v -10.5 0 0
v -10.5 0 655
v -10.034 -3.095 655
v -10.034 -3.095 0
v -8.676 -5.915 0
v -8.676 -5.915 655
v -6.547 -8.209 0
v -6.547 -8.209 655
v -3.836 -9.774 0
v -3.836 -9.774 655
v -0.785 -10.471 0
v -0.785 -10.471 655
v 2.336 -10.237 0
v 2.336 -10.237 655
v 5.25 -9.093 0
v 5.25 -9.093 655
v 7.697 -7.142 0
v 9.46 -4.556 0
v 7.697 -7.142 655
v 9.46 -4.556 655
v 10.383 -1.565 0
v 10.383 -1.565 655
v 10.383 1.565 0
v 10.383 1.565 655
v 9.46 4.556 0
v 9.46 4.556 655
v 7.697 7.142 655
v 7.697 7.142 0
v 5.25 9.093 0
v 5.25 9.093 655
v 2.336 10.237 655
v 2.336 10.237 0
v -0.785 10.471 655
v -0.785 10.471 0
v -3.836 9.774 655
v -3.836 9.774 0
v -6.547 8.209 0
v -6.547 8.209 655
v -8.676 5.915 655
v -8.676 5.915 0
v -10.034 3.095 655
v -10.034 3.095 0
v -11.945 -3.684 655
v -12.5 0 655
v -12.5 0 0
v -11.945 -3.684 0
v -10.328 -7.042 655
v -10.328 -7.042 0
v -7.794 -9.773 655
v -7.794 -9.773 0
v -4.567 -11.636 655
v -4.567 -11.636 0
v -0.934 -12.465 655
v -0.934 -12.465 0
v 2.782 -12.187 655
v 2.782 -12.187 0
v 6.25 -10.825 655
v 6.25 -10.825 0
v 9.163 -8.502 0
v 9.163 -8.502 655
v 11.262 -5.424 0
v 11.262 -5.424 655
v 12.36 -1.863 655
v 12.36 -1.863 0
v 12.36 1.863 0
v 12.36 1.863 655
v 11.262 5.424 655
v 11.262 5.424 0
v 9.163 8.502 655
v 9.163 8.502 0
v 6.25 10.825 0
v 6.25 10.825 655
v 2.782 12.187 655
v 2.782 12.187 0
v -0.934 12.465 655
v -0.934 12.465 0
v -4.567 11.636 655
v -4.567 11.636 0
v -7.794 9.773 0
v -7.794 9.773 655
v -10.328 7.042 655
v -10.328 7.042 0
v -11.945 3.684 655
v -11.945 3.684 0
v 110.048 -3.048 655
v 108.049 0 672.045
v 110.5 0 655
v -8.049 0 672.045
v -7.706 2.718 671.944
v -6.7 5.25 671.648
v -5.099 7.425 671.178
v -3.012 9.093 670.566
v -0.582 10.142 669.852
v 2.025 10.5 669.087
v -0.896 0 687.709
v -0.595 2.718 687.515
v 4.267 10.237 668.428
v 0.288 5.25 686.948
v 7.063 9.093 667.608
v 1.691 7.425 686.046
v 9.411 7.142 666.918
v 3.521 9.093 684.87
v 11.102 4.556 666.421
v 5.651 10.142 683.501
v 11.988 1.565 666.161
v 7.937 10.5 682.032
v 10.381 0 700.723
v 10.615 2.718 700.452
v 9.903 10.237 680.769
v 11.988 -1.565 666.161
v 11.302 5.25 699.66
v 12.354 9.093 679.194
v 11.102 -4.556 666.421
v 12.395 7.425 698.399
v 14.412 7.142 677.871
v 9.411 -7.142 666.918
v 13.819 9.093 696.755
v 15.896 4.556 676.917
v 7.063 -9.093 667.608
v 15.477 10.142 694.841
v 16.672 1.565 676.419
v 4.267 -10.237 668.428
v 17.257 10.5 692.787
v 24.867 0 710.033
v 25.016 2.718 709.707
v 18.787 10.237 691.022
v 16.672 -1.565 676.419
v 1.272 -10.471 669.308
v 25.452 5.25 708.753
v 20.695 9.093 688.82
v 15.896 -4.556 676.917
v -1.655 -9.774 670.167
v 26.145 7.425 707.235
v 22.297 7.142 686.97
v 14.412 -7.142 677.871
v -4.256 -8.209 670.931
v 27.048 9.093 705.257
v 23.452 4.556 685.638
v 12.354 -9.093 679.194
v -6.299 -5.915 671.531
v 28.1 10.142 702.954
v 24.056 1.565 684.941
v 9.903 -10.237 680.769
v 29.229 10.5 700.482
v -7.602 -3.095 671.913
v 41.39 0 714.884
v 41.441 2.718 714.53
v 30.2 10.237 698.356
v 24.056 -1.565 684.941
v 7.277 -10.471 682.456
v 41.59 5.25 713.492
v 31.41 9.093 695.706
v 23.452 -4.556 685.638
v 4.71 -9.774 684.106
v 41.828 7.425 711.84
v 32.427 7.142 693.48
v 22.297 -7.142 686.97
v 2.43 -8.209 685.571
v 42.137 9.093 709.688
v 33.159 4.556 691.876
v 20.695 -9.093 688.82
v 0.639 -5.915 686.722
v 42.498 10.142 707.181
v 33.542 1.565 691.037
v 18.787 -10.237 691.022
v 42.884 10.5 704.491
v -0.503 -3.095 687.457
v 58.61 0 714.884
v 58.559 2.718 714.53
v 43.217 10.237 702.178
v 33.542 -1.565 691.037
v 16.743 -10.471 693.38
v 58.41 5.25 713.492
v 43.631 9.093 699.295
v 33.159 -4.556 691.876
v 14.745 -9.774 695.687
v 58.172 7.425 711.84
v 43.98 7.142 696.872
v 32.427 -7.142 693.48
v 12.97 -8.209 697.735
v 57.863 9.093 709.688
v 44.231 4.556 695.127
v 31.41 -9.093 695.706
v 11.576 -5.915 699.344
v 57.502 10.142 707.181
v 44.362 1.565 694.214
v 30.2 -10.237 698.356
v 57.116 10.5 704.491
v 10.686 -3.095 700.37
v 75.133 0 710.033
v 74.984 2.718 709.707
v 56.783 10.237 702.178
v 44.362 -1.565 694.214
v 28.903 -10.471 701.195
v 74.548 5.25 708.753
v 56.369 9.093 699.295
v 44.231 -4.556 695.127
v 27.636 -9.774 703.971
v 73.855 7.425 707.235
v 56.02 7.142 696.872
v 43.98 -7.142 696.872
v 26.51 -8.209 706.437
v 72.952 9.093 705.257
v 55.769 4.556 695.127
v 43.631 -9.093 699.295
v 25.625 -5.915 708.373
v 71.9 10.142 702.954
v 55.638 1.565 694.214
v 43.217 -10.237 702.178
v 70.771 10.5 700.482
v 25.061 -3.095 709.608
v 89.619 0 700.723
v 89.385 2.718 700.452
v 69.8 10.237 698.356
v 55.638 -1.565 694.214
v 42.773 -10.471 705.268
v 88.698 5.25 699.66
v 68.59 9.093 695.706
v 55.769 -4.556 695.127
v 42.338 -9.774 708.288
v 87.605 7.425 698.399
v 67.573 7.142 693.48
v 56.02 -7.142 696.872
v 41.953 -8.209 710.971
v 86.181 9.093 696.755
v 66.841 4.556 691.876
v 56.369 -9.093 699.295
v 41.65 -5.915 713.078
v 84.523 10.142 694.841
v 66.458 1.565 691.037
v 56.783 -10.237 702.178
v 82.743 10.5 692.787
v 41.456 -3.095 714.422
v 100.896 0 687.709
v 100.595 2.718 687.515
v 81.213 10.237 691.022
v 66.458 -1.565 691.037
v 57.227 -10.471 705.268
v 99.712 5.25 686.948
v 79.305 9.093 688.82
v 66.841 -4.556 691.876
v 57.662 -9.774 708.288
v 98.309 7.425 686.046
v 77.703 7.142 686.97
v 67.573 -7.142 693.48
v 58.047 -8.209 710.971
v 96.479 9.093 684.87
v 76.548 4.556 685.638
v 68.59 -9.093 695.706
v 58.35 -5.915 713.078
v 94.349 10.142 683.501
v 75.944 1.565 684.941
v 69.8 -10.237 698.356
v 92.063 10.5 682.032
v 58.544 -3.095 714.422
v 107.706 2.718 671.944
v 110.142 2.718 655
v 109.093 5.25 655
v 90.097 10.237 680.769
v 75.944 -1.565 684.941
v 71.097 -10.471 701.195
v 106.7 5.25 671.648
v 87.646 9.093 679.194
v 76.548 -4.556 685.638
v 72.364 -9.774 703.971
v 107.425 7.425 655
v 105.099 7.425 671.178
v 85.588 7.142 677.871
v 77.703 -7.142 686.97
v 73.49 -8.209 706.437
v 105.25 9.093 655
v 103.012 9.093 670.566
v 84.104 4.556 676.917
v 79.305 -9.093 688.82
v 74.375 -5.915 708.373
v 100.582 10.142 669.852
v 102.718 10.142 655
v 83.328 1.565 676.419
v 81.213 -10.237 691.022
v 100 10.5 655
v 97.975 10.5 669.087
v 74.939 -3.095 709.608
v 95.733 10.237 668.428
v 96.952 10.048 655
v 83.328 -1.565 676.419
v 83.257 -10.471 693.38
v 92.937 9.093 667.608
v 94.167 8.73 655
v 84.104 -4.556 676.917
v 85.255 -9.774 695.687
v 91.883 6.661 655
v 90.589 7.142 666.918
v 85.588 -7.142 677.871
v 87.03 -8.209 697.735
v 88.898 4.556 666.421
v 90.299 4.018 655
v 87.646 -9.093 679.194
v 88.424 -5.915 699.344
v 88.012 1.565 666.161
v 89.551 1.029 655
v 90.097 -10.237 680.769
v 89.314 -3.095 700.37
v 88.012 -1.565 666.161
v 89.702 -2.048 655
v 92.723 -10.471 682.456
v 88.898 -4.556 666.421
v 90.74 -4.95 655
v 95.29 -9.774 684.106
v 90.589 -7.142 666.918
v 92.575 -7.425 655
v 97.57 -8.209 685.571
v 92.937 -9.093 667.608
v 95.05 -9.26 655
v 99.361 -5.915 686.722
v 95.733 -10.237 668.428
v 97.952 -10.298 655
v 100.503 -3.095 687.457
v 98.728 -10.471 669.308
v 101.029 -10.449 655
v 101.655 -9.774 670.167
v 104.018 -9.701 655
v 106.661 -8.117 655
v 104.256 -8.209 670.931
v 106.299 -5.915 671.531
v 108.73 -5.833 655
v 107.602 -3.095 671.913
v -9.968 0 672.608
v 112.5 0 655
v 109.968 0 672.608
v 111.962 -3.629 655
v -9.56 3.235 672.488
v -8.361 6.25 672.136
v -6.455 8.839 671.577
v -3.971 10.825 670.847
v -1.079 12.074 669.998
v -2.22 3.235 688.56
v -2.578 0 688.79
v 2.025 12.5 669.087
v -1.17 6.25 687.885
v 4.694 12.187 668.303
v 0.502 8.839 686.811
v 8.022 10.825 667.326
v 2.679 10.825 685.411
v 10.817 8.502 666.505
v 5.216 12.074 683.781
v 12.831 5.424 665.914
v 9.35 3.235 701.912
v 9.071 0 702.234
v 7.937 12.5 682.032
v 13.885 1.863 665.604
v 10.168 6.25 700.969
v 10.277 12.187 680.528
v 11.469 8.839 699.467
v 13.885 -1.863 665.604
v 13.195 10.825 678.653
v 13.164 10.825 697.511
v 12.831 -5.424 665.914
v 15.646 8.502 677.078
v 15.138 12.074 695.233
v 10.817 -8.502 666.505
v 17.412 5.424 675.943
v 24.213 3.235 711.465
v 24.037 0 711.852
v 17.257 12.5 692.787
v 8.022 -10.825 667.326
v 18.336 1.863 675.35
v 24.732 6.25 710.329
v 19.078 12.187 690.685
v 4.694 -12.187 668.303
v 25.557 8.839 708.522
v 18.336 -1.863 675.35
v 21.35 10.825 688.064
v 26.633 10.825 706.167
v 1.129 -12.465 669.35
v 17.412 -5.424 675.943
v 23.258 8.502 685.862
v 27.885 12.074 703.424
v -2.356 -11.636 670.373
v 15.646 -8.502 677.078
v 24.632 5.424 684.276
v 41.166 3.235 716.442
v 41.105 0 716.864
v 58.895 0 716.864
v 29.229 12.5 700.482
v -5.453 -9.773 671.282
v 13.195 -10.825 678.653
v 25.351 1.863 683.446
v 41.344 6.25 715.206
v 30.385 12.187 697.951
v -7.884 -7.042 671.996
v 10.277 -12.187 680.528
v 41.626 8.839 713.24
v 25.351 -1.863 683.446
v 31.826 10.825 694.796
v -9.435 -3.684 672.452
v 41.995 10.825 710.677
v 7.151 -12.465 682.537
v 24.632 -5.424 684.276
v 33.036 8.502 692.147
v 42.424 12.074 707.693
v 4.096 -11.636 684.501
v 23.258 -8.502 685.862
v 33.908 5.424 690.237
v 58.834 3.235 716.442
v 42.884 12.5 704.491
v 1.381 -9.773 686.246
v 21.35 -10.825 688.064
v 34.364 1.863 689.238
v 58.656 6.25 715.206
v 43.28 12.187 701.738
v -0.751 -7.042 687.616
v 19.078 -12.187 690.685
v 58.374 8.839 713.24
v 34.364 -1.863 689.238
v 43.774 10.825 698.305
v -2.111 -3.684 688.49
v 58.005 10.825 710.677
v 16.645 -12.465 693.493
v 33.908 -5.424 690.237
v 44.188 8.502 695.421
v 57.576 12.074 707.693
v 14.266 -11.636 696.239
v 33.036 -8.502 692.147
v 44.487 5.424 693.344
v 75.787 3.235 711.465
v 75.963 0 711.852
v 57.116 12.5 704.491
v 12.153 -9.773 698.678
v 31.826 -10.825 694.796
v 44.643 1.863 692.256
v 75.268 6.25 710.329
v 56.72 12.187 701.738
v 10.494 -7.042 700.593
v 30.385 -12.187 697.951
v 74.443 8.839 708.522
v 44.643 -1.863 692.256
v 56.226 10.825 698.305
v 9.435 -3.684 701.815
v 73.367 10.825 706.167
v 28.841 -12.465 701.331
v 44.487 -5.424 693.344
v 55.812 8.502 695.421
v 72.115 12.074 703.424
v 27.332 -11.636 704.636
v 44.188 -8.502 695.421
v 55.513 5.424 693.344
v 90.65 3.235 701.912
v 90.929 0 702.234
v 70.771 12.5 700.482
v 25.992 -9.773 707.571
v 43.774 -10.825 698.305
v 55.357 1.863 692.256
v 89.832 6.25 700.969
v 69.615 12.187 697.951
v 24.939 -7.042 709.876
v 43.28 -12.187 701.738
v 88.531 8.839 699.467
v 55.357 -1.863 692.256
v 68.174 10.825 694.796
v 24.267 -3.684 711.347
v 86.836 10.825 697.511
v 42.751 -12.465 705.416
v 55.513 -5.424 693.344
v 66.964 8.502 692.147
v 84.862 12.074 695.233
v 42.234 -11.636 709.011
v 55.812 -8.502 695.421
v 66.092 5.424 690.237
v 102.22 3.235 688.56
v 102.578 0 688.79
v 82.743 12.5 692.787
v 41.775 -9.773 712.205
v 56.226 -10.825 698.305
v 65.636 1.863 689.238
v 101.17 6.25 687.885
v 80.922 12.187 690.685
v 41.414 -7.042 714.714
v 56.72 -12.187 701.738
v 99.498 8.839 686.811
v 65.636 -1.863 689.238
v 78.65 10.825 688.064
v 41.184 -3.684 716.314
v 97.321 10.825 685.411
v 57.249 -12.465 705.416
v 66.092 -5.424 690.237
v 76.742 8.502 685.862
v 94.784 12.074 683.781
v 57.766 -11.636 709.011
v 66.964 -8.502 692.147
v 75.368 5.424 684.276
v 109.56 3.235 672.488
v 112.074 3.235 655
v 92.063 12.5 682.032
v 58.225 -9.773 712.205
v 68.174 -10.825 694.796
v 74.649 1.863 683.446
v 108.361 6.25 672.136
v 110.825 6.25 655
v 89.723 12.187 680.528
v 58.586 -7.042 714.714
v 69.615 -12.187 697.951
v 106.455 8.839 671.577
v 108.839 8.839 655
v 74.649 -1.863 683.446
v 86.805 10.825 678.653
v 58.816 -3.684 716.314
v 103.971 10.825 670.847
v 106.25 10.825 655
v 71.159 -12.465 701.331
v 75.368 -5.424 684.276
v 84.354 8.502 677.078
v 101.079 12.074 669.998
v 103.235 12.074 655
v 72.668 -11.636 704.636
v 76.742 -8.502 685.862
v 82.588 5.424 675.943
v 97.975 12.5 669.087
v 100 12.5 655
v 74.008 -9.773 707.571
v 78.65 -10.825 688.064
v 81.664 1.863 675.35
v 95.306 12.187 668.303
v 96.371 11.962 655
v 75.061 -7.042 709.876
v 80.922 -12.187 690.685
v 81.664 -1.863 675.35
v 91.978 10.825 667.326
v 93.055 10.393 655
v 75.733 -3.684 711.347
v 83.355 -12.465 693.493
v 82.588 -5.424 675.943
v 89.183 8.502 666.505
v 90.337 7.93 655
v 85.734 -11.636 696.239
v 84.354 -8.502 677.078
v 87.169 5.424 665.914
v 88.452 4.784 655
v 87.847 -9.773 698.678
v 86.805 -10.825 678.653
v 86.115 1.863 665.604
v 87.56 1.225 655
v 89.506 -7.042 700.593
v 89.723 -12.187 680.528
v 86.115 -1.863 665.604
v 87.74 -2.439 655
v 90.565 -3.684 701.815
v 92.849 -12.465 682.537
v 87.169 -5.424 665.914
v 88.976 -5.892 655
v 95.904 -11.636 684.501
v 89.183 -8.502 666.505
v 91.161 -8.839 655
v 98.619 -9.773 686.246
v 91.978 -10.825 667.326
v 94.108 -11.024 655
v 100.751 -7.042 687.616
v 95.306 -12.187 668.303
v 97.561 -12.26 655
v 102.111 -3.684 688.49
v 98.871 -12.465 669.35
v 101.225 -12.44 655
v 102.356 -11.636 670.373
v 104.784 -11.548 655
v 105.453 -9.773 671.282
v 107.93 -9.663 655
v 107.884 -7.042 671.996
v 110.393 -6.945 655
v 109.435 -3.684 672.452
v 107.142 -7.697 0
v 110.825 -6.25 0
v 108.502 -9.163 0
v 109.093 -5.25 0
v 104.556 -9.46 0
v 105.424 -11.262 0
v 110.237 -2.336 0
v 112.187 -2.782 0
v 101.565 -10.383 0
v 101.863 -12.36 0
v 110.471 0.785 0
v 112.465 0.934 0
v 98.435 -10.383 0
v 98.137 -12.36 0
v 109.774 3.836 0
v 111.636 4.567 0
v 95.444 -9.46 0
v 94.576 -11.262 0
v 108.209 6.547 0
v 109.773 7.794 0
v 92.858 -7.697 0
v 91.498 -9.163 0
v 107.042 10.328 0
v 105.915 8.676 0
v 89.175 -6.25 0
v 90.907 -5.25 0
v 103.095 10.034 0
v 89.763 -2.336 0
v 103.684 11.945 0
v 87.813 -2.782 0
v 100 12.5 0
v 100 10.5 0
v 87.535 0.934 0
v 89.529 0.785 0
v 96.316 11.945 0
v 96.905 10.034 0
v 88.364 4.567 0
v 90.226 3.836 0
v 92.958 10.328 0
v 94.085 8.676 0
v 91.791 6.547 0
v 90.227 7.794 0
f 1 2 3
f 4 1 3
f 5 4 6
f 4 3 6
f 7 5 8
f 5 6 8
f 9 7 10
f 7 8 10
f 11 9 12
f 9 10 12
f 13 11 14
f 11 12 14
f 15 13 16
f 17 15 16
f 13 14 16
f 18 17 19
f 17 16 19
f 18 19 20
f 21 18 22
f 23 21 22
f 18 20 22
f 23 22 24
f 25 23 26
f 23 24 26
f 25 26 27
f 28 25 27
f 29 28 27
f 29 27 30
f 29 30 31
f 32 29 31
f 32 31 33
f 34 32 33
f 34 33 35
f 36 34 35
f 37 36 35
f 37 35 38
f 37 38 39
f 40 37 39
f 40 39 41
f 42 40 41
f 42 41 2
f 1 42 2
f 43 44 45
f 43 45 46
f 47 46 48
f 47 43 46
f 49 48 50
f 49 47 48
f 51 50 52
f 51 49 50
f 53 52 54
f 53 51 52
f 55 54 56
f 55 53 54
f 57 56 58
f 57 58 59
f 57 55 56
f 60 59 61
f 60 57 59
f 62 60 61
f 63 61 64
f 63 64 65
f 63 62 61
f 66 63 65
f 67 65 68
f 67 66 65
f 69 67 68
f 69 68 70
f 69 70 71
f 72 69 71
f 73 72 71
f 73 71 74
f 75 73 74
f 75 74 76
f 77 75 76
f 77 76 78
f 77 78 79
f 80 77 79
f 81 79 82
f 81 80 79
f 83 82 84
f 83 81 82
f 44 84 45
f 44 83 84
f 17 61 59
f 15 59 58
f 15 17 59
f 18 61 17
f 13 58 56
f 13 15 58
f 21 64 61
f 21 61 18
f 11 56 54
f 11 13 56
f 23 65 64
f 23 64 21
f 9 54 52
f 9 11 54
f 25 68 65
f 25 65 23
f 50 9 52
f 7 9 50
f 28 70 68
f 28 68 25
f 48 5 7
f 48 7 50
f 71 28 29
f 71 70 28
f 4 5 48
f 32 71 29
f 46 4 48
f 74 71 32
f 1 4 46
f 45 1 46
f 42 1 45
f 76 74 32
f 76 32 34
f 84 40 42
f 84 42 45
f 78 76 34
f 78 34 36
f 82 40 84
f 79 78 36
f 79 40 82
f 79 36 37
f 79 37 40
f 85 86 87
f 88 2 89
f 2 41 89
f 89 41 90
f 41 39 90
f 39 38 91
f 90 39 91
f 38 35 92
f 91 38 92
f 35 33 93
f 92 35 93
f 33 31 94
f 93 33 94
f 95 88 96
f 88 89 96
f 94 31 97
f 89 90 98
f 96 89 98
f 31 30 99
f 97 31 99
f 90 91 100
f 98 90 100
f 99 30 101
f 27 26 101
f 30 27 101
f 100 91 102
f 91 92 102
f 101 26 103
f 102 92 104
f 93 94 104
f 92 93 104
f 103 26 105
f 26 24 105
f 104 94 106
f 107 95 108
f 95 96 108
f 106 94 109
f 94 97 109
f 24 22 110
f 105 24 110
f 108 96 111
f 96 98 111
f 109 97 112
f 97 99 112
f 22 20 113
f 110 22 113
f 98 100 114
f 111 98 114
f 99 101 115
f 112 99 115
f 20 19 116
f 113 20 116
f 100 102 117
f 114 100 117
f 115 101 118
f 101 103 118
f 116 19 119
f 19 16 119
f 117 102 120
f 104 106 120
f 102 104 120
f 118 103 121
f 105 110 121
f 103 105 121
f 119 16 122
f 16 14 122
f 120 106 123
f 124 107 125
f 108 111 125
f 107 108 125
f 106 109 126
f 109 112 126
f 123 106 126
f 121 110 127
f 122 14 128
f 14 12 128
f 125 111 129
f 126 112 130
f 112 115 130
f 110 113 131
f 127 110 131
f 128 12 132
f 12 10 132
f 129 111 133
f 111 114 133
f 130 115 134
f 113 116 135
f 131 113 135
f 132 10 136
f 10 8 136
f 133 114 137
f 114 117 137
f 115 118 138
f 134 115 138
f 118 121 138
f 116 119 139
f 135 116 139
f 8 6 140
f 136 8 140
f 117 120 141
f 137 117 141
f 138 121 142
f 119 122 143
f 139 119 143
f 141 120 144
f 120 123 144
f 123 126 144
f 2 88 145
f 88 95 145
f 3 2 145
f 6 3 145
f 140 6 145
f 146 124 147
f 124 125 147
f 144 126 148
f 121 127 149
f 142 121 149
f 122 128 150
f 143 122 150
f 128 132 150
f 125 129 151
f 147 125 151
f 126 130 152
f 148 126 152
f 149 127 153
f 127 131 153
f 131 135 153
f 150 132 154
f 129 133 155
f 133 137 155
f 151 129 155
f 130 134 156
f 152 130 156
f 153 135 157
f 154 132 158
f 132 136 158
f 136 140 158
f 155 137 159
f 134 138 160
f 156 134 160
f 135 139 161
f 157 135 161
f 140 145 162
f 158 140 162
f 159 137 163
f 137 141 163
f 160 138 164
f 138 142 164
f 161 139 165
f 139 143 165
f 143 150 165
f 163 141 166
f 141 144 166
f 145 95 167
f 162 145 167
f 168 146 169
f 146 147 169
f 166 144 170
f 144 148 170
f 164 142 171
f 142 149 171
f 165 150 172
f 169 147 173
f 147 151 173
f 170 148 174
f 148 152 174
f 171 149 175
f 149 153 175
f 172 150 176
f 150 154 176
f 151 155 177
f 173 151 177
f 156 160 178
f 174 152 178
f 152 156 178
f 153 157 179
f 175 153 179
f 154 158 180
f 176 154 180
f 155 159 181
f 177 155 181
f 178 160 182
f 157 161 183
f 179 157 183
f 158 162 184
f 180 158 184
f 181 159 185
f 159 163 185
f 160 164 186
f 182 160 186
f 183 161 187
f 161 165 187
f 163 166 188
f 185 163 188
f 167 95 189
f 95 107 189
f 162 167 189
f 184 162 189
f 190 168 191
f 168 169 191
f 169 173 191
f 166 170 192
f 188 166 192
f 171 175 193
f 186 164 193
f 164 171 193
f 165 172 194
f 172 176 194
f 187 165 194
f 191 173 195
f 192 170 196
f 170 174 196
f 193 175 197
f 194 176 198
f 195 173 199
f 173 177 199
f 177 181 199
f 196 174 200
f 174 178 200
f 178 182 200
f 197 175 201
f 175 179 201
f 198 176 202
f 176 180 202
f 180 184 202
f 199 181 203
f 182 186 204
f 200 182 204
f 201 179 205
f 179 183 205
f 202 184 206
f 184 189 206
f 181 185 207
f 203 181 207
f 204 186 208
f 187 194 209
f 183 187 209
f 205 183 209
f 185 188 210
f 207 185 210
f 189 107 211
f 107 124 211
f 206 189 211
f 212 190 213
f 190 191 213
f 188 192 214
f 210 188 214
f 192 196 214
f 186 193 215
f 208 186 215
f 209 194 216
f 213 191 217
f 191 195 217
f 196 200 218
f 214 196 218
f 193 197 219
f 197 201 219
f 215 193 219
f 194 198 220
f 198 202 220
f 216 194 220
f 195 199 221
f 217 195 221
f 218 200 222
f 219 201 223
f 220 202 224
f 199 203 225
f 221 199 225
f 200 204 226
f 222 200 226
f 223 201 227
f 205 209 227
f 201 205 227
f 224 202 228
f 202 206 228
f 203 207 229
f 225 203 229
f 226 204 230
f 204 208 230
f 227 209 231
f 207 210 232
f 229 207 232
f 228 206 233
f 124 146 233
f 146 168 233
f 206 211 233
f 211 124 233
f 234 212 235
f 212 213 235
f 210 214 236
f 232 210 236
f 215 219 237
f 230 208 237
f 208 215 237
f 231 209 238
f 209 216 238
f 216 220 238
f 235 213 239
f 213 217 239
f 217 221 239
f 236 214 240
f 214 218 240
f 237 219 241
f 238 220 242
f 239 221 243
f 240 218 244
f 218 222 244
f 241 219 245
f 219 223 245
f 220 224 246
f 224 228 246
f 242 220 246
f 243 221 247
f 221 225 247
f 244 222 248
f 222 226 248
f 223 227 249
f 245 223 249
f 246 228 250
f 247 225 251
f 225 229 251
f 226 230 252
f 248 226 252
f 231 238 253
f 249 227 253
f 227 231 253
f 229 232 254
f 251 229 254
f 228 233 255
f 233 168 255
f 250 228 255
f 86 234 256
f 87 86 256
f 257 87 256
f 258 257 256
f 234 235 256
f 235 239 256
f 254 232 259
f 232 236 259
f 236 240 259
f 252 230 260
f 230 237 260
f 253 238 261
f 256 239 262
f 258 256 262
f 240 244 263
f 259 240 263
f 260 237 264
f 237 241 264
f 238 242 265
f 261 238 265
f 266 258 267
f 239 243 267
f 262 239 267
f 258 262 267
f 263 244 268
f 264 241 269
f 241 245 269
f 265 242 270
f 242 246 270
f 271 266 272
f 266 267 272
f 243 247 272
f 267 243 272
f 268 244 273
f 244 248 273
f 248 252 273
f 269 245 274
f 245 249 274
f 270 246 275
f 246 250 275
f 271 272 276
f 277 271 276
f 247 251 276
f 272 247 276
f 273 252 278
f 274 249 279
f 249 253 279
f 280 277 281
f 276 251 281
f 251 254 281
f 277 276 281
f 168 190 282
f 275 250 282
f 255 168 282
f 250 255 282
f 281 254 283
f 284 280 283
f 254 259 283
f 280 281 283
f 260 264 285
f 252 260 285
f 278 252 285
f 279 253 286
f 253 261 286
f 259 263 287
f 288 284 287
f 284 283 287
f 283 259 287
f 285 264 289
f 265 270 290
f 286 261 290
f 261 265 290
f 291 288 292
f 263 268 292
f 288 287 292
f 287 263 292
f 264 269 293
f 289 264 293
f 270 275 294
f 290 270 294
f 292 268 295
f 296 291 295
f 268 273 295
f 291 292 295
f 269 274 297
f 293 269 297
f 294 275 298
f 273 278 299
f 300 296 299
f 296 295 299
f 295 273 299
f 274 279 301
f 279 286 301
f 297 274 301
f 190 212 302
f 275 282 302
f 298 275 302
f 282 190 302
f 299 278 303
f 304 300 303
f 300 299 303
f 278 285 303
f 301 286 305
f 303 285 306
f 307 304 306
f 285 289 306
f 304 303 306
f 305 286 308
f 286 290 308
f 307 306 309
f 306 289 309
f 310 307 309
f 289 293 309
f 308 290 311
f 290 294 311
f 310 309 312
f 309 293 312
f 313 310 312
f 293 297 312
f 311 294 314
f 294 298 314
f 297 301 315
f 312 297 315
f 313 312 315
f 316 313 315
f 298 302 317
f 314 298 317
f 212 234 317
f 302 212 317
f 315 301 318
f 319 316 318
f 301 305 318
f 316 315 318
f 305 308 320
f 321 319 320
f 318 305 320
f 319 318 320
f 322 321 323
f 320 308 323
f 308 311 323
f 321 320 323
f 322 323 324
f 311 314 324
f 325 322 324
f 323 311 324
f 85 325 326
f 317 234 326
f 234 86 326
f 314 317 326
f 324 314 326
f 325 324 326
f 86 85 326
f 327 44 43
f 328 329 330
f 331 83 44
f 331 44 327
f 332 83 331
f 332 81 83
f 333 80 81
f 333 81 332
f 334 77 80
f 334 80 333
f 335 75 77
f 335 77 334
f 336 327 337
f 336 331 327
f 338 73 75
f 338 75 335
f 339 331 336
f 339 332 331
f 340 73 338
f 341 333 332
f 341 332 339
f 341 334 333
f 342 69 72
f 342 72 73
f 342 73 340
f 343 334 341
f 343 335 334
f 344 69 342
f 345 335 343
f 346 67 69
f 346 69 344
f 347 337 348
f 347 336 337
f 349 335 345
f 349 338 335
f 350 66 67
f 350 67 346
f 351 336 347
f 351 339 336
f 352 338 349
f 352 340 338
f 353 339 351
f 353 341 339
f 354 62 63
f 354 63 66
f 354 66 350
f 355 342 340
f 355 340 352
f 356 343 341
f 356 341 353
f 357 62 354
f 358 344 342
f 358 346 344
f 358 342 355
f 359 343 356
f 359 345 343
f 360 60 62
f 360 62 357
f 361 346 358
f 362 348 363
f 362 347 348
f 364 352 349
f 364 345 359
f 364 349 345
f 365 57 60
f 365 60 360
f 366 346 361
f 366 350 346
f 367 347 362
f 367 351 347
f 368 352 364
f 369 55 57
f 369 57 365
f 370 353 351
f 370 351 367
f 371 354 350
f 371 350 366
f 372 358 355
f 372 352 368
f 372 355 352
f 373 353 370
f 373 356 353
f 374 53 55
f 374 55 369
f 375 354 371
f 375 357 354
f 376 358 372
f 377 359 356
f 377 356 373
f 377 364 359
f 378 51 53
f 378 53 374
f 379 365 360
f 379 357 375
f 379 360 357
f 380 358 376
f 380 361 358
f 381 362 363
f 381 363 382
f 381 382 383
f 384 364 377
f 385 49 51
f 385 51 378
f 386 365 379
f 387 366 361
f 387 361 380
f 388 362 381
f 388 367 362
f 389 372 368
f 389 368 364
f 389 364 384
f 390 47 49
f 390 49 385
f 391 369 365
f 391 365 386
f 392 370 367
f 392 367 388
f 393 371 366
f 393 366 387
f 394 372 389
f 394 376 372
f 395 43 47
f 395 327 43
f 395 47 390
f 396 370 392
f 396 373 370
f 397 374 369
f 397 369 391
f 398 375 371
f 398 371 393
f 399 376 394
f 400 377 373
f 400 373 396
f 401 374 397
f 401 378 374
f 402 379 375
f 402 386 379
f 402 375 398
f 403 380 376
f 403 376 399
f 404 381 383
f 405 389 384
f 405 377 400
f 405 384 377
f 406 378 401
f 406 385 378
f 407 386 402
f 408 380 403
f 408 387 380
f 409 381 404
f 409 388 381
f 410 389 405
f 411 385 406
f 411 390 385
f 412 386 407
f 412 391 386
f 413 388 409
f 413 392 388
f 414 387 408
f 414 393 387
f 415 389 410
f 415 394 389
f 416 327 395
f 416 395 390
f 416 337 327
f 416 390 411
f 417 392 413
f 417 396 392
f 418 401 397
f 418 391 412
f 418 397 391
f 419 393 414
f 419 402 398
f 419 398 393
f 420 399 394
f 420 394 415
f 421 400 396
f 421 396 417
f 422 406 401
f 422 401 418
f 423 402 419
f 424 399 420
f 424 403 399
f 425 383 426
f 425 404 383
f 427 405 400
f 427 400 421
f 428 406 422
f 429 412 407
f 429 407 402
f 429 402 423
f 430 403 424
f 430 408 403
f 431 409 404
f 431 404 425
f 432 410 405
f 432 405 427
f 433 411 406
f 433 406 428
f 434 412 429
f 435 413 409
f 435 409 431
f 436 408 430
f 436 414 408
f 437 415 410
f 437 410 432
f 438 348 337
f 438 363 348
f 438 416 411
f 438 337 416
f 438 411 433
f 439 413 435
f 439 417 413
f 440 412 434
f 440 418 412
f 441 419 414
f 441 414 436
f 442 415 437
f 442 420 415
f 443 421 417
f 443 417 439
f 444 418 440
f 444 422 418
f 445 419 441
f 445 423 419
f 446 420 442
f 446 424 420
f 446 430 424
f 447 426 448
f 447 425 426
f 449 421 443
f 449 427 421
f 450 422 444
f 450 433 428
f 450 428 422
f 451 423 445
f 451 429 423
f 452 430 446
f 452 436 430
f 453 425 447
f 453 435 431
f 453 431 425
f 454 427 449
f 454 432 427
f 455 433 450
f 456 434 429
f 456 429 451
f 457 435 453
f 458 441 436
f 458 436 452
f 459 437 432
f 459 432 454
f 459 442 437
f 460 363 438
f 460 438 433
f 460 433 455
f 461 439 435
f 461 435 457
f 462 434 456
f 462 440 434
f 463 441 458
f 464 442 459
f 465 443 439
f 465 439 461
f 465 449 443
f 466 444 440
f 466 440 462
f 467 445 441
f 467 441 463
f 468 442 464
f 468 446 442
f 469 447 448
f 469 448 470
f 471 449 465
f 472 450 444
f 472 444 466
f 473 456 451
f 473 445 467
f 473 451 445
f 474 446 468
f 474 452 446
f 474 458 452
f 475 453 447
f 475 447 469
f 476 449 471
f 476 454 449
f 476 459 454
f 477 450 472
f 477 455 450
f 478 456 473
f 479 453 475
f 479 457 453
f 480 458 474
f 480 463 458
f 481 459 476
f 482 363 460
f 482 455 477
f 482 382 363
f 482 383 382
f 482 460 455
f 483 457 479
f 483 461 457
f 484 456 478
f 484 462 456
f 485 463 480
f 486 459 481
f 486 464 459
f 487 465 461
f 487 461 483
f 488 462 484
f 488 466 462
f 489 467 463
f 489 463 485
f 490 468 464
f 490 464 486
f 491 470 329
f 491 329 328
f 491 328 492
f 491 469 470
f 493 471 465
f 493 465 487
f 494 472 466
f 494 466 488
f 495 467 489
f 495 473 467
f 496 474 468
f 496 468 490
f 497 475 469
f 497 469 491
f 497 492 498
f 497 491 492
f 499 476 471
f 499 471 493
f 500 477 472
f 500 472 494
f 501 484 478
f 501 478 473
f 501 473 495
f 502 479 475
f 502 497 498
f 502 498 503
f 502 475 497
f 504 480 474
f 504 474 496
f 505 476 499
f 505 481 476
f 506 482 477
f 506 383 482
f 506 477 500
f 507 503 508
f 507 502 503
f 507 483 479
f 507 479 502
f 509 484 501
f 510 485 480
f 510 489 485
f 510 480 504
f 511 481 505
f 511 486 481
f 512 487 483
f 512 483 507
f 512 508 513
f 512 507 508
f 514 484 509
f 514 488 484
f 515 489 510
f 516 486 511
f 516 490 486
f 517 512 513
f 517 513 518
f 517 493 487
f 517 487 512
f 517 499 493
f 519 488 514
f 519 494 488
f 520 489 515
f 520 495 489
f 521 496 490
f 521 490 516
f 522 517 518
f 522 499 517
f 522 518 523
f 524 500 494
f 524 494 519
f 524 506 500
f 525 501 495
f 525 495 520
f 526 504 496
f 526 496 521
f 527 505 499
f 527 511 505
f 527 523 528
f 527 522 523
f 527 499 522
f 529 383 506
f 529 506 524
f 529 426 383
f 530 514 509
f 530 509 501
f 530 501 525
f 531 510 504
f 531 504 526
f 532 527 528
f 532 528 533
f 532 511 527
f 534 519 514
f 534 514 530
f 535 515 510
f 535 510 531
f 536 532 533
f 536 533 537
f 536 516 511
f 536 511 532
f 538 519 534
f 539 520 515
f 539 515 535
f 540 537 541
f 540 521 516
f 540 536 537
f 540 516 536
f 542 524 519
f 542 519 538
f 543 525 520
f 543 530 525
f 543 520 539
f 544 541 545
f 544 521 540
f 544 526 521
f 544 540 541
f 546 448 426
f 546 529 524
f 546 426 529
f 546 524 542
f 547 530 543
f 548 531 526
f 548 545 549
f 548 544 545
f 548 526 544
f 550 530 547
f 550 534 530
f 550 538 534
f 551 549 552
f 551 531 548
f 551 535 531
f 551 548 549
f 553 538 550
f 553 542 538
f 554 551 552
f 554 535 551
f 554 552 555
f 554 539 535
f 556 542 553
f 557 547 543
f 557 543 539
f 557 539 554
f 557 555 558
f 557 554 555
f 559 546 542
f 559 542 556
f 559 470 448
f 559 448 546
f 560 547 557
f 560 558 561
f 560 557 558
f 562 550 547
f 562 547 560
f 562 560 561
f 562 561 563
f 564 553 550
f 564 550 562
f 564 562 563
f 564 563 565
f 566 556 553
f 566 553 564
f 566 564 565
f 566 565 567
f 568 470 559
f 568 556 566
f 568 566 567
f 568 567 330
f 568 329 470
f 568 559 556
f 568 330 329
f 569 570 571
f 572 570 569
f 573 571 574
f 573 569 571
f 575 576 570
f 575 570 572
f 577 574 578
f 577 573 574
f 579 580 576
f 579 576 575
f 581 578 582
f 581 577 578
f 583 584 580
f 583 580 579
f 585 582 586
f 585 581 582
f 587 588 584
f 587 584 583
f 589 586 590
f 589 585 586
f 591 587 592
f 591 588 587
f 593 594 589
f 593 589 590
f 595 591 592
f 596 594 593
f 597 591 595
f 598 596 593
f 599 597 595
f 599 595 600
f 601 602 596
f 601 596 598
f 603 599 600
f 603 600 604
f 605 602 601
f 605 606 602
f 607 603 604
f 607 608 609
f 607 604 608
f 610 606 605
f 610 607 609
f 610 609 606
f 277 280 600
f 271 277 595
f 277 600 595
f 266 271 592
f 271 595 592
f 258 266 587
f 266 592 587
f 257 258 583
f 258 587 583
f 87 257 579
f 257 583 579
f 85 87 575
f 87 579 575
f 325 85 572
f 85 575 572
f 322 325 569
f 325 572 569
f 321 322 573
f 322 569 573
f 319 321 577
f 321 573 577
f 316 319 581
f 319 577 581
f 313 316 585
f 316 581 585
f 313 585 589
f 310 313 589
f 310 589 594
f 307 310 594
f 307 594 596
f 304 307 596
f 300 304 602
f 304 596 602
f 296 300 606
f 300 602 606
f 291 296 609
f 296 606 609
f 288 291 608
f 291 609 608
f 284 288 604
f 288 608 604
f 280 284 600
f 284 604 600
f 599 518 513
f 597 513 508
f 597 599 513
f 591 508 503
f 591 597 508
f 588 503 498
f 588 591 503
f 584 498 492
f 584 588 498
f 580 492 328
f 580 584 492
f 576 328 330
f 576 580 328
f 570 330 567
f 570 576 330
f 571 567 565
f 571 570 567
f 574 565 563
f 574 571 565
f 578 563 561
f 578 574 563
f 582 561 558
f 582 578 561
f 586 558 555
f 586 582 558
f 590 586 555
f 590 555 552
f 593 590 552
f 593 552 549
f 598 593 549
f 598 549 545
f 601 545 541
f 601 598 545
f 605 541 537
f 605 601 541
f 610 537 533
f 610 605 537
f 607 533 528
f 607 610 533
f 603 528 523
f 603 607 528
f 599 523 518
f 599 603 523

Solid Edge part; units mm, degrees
sketch "Sketch1" plane through (0, 0, 0) normal (0, -1, 0) x (1, 0, 0)
  line L0 (0, 0) -> (0, 655)
  dimension "D1" = 100
  dimension "D2" = 655
sketch "Sketch2" plane through (0, 0, 0) normal (0, 0, -1) x (-1, 0, 0)
  circle A0 centre (0, 0) radius 12.5
sweep "SweptProtrusion_8" add profiles "Sketch2" path "Sketch1"
sketch "Sketch3" plane through (0, 0, 0) normal (0, -1, 0) x (1, 0, 0)
  arc A0 (0, 655) -> (100, 655) centre (50, 655) cw
sketch "Sketch4" plane through (0, 0, 655) normal (0, 0, 1) x (-1, 0, 0)
  circle A0 centre (0, 0) radius 12.5
sweep "SweptProtrusion_10" add profiles "Sketch4" path "Sketch3"
sketch "Sketch5" plane through (0, 0, 0) normal (0, -1, 0) x (1, 0, 0)
  line L0 (100, 655) -> (100, 0)
  dimension "D1" = 100
  dimension "D2" = 655
sketch "Sketch6" plane through (100, 0, 655) normal (0, 0, -1) x (0, 1, 0)
  circle A0 centre (0, 0) radius 12.5
sweep "SweptProtrusion_11" add profiles "Sketch6" path "Sketch5"
shell "Thinwall_2" thickness 2 removed faces 4 at (8.5833, -8.0833, 0) at (108.5833, -8.0833, 0) at (8.5833, -8.0833, 0) at (108.5833, -8.0833, 0)
properties material "Stainless steel"
